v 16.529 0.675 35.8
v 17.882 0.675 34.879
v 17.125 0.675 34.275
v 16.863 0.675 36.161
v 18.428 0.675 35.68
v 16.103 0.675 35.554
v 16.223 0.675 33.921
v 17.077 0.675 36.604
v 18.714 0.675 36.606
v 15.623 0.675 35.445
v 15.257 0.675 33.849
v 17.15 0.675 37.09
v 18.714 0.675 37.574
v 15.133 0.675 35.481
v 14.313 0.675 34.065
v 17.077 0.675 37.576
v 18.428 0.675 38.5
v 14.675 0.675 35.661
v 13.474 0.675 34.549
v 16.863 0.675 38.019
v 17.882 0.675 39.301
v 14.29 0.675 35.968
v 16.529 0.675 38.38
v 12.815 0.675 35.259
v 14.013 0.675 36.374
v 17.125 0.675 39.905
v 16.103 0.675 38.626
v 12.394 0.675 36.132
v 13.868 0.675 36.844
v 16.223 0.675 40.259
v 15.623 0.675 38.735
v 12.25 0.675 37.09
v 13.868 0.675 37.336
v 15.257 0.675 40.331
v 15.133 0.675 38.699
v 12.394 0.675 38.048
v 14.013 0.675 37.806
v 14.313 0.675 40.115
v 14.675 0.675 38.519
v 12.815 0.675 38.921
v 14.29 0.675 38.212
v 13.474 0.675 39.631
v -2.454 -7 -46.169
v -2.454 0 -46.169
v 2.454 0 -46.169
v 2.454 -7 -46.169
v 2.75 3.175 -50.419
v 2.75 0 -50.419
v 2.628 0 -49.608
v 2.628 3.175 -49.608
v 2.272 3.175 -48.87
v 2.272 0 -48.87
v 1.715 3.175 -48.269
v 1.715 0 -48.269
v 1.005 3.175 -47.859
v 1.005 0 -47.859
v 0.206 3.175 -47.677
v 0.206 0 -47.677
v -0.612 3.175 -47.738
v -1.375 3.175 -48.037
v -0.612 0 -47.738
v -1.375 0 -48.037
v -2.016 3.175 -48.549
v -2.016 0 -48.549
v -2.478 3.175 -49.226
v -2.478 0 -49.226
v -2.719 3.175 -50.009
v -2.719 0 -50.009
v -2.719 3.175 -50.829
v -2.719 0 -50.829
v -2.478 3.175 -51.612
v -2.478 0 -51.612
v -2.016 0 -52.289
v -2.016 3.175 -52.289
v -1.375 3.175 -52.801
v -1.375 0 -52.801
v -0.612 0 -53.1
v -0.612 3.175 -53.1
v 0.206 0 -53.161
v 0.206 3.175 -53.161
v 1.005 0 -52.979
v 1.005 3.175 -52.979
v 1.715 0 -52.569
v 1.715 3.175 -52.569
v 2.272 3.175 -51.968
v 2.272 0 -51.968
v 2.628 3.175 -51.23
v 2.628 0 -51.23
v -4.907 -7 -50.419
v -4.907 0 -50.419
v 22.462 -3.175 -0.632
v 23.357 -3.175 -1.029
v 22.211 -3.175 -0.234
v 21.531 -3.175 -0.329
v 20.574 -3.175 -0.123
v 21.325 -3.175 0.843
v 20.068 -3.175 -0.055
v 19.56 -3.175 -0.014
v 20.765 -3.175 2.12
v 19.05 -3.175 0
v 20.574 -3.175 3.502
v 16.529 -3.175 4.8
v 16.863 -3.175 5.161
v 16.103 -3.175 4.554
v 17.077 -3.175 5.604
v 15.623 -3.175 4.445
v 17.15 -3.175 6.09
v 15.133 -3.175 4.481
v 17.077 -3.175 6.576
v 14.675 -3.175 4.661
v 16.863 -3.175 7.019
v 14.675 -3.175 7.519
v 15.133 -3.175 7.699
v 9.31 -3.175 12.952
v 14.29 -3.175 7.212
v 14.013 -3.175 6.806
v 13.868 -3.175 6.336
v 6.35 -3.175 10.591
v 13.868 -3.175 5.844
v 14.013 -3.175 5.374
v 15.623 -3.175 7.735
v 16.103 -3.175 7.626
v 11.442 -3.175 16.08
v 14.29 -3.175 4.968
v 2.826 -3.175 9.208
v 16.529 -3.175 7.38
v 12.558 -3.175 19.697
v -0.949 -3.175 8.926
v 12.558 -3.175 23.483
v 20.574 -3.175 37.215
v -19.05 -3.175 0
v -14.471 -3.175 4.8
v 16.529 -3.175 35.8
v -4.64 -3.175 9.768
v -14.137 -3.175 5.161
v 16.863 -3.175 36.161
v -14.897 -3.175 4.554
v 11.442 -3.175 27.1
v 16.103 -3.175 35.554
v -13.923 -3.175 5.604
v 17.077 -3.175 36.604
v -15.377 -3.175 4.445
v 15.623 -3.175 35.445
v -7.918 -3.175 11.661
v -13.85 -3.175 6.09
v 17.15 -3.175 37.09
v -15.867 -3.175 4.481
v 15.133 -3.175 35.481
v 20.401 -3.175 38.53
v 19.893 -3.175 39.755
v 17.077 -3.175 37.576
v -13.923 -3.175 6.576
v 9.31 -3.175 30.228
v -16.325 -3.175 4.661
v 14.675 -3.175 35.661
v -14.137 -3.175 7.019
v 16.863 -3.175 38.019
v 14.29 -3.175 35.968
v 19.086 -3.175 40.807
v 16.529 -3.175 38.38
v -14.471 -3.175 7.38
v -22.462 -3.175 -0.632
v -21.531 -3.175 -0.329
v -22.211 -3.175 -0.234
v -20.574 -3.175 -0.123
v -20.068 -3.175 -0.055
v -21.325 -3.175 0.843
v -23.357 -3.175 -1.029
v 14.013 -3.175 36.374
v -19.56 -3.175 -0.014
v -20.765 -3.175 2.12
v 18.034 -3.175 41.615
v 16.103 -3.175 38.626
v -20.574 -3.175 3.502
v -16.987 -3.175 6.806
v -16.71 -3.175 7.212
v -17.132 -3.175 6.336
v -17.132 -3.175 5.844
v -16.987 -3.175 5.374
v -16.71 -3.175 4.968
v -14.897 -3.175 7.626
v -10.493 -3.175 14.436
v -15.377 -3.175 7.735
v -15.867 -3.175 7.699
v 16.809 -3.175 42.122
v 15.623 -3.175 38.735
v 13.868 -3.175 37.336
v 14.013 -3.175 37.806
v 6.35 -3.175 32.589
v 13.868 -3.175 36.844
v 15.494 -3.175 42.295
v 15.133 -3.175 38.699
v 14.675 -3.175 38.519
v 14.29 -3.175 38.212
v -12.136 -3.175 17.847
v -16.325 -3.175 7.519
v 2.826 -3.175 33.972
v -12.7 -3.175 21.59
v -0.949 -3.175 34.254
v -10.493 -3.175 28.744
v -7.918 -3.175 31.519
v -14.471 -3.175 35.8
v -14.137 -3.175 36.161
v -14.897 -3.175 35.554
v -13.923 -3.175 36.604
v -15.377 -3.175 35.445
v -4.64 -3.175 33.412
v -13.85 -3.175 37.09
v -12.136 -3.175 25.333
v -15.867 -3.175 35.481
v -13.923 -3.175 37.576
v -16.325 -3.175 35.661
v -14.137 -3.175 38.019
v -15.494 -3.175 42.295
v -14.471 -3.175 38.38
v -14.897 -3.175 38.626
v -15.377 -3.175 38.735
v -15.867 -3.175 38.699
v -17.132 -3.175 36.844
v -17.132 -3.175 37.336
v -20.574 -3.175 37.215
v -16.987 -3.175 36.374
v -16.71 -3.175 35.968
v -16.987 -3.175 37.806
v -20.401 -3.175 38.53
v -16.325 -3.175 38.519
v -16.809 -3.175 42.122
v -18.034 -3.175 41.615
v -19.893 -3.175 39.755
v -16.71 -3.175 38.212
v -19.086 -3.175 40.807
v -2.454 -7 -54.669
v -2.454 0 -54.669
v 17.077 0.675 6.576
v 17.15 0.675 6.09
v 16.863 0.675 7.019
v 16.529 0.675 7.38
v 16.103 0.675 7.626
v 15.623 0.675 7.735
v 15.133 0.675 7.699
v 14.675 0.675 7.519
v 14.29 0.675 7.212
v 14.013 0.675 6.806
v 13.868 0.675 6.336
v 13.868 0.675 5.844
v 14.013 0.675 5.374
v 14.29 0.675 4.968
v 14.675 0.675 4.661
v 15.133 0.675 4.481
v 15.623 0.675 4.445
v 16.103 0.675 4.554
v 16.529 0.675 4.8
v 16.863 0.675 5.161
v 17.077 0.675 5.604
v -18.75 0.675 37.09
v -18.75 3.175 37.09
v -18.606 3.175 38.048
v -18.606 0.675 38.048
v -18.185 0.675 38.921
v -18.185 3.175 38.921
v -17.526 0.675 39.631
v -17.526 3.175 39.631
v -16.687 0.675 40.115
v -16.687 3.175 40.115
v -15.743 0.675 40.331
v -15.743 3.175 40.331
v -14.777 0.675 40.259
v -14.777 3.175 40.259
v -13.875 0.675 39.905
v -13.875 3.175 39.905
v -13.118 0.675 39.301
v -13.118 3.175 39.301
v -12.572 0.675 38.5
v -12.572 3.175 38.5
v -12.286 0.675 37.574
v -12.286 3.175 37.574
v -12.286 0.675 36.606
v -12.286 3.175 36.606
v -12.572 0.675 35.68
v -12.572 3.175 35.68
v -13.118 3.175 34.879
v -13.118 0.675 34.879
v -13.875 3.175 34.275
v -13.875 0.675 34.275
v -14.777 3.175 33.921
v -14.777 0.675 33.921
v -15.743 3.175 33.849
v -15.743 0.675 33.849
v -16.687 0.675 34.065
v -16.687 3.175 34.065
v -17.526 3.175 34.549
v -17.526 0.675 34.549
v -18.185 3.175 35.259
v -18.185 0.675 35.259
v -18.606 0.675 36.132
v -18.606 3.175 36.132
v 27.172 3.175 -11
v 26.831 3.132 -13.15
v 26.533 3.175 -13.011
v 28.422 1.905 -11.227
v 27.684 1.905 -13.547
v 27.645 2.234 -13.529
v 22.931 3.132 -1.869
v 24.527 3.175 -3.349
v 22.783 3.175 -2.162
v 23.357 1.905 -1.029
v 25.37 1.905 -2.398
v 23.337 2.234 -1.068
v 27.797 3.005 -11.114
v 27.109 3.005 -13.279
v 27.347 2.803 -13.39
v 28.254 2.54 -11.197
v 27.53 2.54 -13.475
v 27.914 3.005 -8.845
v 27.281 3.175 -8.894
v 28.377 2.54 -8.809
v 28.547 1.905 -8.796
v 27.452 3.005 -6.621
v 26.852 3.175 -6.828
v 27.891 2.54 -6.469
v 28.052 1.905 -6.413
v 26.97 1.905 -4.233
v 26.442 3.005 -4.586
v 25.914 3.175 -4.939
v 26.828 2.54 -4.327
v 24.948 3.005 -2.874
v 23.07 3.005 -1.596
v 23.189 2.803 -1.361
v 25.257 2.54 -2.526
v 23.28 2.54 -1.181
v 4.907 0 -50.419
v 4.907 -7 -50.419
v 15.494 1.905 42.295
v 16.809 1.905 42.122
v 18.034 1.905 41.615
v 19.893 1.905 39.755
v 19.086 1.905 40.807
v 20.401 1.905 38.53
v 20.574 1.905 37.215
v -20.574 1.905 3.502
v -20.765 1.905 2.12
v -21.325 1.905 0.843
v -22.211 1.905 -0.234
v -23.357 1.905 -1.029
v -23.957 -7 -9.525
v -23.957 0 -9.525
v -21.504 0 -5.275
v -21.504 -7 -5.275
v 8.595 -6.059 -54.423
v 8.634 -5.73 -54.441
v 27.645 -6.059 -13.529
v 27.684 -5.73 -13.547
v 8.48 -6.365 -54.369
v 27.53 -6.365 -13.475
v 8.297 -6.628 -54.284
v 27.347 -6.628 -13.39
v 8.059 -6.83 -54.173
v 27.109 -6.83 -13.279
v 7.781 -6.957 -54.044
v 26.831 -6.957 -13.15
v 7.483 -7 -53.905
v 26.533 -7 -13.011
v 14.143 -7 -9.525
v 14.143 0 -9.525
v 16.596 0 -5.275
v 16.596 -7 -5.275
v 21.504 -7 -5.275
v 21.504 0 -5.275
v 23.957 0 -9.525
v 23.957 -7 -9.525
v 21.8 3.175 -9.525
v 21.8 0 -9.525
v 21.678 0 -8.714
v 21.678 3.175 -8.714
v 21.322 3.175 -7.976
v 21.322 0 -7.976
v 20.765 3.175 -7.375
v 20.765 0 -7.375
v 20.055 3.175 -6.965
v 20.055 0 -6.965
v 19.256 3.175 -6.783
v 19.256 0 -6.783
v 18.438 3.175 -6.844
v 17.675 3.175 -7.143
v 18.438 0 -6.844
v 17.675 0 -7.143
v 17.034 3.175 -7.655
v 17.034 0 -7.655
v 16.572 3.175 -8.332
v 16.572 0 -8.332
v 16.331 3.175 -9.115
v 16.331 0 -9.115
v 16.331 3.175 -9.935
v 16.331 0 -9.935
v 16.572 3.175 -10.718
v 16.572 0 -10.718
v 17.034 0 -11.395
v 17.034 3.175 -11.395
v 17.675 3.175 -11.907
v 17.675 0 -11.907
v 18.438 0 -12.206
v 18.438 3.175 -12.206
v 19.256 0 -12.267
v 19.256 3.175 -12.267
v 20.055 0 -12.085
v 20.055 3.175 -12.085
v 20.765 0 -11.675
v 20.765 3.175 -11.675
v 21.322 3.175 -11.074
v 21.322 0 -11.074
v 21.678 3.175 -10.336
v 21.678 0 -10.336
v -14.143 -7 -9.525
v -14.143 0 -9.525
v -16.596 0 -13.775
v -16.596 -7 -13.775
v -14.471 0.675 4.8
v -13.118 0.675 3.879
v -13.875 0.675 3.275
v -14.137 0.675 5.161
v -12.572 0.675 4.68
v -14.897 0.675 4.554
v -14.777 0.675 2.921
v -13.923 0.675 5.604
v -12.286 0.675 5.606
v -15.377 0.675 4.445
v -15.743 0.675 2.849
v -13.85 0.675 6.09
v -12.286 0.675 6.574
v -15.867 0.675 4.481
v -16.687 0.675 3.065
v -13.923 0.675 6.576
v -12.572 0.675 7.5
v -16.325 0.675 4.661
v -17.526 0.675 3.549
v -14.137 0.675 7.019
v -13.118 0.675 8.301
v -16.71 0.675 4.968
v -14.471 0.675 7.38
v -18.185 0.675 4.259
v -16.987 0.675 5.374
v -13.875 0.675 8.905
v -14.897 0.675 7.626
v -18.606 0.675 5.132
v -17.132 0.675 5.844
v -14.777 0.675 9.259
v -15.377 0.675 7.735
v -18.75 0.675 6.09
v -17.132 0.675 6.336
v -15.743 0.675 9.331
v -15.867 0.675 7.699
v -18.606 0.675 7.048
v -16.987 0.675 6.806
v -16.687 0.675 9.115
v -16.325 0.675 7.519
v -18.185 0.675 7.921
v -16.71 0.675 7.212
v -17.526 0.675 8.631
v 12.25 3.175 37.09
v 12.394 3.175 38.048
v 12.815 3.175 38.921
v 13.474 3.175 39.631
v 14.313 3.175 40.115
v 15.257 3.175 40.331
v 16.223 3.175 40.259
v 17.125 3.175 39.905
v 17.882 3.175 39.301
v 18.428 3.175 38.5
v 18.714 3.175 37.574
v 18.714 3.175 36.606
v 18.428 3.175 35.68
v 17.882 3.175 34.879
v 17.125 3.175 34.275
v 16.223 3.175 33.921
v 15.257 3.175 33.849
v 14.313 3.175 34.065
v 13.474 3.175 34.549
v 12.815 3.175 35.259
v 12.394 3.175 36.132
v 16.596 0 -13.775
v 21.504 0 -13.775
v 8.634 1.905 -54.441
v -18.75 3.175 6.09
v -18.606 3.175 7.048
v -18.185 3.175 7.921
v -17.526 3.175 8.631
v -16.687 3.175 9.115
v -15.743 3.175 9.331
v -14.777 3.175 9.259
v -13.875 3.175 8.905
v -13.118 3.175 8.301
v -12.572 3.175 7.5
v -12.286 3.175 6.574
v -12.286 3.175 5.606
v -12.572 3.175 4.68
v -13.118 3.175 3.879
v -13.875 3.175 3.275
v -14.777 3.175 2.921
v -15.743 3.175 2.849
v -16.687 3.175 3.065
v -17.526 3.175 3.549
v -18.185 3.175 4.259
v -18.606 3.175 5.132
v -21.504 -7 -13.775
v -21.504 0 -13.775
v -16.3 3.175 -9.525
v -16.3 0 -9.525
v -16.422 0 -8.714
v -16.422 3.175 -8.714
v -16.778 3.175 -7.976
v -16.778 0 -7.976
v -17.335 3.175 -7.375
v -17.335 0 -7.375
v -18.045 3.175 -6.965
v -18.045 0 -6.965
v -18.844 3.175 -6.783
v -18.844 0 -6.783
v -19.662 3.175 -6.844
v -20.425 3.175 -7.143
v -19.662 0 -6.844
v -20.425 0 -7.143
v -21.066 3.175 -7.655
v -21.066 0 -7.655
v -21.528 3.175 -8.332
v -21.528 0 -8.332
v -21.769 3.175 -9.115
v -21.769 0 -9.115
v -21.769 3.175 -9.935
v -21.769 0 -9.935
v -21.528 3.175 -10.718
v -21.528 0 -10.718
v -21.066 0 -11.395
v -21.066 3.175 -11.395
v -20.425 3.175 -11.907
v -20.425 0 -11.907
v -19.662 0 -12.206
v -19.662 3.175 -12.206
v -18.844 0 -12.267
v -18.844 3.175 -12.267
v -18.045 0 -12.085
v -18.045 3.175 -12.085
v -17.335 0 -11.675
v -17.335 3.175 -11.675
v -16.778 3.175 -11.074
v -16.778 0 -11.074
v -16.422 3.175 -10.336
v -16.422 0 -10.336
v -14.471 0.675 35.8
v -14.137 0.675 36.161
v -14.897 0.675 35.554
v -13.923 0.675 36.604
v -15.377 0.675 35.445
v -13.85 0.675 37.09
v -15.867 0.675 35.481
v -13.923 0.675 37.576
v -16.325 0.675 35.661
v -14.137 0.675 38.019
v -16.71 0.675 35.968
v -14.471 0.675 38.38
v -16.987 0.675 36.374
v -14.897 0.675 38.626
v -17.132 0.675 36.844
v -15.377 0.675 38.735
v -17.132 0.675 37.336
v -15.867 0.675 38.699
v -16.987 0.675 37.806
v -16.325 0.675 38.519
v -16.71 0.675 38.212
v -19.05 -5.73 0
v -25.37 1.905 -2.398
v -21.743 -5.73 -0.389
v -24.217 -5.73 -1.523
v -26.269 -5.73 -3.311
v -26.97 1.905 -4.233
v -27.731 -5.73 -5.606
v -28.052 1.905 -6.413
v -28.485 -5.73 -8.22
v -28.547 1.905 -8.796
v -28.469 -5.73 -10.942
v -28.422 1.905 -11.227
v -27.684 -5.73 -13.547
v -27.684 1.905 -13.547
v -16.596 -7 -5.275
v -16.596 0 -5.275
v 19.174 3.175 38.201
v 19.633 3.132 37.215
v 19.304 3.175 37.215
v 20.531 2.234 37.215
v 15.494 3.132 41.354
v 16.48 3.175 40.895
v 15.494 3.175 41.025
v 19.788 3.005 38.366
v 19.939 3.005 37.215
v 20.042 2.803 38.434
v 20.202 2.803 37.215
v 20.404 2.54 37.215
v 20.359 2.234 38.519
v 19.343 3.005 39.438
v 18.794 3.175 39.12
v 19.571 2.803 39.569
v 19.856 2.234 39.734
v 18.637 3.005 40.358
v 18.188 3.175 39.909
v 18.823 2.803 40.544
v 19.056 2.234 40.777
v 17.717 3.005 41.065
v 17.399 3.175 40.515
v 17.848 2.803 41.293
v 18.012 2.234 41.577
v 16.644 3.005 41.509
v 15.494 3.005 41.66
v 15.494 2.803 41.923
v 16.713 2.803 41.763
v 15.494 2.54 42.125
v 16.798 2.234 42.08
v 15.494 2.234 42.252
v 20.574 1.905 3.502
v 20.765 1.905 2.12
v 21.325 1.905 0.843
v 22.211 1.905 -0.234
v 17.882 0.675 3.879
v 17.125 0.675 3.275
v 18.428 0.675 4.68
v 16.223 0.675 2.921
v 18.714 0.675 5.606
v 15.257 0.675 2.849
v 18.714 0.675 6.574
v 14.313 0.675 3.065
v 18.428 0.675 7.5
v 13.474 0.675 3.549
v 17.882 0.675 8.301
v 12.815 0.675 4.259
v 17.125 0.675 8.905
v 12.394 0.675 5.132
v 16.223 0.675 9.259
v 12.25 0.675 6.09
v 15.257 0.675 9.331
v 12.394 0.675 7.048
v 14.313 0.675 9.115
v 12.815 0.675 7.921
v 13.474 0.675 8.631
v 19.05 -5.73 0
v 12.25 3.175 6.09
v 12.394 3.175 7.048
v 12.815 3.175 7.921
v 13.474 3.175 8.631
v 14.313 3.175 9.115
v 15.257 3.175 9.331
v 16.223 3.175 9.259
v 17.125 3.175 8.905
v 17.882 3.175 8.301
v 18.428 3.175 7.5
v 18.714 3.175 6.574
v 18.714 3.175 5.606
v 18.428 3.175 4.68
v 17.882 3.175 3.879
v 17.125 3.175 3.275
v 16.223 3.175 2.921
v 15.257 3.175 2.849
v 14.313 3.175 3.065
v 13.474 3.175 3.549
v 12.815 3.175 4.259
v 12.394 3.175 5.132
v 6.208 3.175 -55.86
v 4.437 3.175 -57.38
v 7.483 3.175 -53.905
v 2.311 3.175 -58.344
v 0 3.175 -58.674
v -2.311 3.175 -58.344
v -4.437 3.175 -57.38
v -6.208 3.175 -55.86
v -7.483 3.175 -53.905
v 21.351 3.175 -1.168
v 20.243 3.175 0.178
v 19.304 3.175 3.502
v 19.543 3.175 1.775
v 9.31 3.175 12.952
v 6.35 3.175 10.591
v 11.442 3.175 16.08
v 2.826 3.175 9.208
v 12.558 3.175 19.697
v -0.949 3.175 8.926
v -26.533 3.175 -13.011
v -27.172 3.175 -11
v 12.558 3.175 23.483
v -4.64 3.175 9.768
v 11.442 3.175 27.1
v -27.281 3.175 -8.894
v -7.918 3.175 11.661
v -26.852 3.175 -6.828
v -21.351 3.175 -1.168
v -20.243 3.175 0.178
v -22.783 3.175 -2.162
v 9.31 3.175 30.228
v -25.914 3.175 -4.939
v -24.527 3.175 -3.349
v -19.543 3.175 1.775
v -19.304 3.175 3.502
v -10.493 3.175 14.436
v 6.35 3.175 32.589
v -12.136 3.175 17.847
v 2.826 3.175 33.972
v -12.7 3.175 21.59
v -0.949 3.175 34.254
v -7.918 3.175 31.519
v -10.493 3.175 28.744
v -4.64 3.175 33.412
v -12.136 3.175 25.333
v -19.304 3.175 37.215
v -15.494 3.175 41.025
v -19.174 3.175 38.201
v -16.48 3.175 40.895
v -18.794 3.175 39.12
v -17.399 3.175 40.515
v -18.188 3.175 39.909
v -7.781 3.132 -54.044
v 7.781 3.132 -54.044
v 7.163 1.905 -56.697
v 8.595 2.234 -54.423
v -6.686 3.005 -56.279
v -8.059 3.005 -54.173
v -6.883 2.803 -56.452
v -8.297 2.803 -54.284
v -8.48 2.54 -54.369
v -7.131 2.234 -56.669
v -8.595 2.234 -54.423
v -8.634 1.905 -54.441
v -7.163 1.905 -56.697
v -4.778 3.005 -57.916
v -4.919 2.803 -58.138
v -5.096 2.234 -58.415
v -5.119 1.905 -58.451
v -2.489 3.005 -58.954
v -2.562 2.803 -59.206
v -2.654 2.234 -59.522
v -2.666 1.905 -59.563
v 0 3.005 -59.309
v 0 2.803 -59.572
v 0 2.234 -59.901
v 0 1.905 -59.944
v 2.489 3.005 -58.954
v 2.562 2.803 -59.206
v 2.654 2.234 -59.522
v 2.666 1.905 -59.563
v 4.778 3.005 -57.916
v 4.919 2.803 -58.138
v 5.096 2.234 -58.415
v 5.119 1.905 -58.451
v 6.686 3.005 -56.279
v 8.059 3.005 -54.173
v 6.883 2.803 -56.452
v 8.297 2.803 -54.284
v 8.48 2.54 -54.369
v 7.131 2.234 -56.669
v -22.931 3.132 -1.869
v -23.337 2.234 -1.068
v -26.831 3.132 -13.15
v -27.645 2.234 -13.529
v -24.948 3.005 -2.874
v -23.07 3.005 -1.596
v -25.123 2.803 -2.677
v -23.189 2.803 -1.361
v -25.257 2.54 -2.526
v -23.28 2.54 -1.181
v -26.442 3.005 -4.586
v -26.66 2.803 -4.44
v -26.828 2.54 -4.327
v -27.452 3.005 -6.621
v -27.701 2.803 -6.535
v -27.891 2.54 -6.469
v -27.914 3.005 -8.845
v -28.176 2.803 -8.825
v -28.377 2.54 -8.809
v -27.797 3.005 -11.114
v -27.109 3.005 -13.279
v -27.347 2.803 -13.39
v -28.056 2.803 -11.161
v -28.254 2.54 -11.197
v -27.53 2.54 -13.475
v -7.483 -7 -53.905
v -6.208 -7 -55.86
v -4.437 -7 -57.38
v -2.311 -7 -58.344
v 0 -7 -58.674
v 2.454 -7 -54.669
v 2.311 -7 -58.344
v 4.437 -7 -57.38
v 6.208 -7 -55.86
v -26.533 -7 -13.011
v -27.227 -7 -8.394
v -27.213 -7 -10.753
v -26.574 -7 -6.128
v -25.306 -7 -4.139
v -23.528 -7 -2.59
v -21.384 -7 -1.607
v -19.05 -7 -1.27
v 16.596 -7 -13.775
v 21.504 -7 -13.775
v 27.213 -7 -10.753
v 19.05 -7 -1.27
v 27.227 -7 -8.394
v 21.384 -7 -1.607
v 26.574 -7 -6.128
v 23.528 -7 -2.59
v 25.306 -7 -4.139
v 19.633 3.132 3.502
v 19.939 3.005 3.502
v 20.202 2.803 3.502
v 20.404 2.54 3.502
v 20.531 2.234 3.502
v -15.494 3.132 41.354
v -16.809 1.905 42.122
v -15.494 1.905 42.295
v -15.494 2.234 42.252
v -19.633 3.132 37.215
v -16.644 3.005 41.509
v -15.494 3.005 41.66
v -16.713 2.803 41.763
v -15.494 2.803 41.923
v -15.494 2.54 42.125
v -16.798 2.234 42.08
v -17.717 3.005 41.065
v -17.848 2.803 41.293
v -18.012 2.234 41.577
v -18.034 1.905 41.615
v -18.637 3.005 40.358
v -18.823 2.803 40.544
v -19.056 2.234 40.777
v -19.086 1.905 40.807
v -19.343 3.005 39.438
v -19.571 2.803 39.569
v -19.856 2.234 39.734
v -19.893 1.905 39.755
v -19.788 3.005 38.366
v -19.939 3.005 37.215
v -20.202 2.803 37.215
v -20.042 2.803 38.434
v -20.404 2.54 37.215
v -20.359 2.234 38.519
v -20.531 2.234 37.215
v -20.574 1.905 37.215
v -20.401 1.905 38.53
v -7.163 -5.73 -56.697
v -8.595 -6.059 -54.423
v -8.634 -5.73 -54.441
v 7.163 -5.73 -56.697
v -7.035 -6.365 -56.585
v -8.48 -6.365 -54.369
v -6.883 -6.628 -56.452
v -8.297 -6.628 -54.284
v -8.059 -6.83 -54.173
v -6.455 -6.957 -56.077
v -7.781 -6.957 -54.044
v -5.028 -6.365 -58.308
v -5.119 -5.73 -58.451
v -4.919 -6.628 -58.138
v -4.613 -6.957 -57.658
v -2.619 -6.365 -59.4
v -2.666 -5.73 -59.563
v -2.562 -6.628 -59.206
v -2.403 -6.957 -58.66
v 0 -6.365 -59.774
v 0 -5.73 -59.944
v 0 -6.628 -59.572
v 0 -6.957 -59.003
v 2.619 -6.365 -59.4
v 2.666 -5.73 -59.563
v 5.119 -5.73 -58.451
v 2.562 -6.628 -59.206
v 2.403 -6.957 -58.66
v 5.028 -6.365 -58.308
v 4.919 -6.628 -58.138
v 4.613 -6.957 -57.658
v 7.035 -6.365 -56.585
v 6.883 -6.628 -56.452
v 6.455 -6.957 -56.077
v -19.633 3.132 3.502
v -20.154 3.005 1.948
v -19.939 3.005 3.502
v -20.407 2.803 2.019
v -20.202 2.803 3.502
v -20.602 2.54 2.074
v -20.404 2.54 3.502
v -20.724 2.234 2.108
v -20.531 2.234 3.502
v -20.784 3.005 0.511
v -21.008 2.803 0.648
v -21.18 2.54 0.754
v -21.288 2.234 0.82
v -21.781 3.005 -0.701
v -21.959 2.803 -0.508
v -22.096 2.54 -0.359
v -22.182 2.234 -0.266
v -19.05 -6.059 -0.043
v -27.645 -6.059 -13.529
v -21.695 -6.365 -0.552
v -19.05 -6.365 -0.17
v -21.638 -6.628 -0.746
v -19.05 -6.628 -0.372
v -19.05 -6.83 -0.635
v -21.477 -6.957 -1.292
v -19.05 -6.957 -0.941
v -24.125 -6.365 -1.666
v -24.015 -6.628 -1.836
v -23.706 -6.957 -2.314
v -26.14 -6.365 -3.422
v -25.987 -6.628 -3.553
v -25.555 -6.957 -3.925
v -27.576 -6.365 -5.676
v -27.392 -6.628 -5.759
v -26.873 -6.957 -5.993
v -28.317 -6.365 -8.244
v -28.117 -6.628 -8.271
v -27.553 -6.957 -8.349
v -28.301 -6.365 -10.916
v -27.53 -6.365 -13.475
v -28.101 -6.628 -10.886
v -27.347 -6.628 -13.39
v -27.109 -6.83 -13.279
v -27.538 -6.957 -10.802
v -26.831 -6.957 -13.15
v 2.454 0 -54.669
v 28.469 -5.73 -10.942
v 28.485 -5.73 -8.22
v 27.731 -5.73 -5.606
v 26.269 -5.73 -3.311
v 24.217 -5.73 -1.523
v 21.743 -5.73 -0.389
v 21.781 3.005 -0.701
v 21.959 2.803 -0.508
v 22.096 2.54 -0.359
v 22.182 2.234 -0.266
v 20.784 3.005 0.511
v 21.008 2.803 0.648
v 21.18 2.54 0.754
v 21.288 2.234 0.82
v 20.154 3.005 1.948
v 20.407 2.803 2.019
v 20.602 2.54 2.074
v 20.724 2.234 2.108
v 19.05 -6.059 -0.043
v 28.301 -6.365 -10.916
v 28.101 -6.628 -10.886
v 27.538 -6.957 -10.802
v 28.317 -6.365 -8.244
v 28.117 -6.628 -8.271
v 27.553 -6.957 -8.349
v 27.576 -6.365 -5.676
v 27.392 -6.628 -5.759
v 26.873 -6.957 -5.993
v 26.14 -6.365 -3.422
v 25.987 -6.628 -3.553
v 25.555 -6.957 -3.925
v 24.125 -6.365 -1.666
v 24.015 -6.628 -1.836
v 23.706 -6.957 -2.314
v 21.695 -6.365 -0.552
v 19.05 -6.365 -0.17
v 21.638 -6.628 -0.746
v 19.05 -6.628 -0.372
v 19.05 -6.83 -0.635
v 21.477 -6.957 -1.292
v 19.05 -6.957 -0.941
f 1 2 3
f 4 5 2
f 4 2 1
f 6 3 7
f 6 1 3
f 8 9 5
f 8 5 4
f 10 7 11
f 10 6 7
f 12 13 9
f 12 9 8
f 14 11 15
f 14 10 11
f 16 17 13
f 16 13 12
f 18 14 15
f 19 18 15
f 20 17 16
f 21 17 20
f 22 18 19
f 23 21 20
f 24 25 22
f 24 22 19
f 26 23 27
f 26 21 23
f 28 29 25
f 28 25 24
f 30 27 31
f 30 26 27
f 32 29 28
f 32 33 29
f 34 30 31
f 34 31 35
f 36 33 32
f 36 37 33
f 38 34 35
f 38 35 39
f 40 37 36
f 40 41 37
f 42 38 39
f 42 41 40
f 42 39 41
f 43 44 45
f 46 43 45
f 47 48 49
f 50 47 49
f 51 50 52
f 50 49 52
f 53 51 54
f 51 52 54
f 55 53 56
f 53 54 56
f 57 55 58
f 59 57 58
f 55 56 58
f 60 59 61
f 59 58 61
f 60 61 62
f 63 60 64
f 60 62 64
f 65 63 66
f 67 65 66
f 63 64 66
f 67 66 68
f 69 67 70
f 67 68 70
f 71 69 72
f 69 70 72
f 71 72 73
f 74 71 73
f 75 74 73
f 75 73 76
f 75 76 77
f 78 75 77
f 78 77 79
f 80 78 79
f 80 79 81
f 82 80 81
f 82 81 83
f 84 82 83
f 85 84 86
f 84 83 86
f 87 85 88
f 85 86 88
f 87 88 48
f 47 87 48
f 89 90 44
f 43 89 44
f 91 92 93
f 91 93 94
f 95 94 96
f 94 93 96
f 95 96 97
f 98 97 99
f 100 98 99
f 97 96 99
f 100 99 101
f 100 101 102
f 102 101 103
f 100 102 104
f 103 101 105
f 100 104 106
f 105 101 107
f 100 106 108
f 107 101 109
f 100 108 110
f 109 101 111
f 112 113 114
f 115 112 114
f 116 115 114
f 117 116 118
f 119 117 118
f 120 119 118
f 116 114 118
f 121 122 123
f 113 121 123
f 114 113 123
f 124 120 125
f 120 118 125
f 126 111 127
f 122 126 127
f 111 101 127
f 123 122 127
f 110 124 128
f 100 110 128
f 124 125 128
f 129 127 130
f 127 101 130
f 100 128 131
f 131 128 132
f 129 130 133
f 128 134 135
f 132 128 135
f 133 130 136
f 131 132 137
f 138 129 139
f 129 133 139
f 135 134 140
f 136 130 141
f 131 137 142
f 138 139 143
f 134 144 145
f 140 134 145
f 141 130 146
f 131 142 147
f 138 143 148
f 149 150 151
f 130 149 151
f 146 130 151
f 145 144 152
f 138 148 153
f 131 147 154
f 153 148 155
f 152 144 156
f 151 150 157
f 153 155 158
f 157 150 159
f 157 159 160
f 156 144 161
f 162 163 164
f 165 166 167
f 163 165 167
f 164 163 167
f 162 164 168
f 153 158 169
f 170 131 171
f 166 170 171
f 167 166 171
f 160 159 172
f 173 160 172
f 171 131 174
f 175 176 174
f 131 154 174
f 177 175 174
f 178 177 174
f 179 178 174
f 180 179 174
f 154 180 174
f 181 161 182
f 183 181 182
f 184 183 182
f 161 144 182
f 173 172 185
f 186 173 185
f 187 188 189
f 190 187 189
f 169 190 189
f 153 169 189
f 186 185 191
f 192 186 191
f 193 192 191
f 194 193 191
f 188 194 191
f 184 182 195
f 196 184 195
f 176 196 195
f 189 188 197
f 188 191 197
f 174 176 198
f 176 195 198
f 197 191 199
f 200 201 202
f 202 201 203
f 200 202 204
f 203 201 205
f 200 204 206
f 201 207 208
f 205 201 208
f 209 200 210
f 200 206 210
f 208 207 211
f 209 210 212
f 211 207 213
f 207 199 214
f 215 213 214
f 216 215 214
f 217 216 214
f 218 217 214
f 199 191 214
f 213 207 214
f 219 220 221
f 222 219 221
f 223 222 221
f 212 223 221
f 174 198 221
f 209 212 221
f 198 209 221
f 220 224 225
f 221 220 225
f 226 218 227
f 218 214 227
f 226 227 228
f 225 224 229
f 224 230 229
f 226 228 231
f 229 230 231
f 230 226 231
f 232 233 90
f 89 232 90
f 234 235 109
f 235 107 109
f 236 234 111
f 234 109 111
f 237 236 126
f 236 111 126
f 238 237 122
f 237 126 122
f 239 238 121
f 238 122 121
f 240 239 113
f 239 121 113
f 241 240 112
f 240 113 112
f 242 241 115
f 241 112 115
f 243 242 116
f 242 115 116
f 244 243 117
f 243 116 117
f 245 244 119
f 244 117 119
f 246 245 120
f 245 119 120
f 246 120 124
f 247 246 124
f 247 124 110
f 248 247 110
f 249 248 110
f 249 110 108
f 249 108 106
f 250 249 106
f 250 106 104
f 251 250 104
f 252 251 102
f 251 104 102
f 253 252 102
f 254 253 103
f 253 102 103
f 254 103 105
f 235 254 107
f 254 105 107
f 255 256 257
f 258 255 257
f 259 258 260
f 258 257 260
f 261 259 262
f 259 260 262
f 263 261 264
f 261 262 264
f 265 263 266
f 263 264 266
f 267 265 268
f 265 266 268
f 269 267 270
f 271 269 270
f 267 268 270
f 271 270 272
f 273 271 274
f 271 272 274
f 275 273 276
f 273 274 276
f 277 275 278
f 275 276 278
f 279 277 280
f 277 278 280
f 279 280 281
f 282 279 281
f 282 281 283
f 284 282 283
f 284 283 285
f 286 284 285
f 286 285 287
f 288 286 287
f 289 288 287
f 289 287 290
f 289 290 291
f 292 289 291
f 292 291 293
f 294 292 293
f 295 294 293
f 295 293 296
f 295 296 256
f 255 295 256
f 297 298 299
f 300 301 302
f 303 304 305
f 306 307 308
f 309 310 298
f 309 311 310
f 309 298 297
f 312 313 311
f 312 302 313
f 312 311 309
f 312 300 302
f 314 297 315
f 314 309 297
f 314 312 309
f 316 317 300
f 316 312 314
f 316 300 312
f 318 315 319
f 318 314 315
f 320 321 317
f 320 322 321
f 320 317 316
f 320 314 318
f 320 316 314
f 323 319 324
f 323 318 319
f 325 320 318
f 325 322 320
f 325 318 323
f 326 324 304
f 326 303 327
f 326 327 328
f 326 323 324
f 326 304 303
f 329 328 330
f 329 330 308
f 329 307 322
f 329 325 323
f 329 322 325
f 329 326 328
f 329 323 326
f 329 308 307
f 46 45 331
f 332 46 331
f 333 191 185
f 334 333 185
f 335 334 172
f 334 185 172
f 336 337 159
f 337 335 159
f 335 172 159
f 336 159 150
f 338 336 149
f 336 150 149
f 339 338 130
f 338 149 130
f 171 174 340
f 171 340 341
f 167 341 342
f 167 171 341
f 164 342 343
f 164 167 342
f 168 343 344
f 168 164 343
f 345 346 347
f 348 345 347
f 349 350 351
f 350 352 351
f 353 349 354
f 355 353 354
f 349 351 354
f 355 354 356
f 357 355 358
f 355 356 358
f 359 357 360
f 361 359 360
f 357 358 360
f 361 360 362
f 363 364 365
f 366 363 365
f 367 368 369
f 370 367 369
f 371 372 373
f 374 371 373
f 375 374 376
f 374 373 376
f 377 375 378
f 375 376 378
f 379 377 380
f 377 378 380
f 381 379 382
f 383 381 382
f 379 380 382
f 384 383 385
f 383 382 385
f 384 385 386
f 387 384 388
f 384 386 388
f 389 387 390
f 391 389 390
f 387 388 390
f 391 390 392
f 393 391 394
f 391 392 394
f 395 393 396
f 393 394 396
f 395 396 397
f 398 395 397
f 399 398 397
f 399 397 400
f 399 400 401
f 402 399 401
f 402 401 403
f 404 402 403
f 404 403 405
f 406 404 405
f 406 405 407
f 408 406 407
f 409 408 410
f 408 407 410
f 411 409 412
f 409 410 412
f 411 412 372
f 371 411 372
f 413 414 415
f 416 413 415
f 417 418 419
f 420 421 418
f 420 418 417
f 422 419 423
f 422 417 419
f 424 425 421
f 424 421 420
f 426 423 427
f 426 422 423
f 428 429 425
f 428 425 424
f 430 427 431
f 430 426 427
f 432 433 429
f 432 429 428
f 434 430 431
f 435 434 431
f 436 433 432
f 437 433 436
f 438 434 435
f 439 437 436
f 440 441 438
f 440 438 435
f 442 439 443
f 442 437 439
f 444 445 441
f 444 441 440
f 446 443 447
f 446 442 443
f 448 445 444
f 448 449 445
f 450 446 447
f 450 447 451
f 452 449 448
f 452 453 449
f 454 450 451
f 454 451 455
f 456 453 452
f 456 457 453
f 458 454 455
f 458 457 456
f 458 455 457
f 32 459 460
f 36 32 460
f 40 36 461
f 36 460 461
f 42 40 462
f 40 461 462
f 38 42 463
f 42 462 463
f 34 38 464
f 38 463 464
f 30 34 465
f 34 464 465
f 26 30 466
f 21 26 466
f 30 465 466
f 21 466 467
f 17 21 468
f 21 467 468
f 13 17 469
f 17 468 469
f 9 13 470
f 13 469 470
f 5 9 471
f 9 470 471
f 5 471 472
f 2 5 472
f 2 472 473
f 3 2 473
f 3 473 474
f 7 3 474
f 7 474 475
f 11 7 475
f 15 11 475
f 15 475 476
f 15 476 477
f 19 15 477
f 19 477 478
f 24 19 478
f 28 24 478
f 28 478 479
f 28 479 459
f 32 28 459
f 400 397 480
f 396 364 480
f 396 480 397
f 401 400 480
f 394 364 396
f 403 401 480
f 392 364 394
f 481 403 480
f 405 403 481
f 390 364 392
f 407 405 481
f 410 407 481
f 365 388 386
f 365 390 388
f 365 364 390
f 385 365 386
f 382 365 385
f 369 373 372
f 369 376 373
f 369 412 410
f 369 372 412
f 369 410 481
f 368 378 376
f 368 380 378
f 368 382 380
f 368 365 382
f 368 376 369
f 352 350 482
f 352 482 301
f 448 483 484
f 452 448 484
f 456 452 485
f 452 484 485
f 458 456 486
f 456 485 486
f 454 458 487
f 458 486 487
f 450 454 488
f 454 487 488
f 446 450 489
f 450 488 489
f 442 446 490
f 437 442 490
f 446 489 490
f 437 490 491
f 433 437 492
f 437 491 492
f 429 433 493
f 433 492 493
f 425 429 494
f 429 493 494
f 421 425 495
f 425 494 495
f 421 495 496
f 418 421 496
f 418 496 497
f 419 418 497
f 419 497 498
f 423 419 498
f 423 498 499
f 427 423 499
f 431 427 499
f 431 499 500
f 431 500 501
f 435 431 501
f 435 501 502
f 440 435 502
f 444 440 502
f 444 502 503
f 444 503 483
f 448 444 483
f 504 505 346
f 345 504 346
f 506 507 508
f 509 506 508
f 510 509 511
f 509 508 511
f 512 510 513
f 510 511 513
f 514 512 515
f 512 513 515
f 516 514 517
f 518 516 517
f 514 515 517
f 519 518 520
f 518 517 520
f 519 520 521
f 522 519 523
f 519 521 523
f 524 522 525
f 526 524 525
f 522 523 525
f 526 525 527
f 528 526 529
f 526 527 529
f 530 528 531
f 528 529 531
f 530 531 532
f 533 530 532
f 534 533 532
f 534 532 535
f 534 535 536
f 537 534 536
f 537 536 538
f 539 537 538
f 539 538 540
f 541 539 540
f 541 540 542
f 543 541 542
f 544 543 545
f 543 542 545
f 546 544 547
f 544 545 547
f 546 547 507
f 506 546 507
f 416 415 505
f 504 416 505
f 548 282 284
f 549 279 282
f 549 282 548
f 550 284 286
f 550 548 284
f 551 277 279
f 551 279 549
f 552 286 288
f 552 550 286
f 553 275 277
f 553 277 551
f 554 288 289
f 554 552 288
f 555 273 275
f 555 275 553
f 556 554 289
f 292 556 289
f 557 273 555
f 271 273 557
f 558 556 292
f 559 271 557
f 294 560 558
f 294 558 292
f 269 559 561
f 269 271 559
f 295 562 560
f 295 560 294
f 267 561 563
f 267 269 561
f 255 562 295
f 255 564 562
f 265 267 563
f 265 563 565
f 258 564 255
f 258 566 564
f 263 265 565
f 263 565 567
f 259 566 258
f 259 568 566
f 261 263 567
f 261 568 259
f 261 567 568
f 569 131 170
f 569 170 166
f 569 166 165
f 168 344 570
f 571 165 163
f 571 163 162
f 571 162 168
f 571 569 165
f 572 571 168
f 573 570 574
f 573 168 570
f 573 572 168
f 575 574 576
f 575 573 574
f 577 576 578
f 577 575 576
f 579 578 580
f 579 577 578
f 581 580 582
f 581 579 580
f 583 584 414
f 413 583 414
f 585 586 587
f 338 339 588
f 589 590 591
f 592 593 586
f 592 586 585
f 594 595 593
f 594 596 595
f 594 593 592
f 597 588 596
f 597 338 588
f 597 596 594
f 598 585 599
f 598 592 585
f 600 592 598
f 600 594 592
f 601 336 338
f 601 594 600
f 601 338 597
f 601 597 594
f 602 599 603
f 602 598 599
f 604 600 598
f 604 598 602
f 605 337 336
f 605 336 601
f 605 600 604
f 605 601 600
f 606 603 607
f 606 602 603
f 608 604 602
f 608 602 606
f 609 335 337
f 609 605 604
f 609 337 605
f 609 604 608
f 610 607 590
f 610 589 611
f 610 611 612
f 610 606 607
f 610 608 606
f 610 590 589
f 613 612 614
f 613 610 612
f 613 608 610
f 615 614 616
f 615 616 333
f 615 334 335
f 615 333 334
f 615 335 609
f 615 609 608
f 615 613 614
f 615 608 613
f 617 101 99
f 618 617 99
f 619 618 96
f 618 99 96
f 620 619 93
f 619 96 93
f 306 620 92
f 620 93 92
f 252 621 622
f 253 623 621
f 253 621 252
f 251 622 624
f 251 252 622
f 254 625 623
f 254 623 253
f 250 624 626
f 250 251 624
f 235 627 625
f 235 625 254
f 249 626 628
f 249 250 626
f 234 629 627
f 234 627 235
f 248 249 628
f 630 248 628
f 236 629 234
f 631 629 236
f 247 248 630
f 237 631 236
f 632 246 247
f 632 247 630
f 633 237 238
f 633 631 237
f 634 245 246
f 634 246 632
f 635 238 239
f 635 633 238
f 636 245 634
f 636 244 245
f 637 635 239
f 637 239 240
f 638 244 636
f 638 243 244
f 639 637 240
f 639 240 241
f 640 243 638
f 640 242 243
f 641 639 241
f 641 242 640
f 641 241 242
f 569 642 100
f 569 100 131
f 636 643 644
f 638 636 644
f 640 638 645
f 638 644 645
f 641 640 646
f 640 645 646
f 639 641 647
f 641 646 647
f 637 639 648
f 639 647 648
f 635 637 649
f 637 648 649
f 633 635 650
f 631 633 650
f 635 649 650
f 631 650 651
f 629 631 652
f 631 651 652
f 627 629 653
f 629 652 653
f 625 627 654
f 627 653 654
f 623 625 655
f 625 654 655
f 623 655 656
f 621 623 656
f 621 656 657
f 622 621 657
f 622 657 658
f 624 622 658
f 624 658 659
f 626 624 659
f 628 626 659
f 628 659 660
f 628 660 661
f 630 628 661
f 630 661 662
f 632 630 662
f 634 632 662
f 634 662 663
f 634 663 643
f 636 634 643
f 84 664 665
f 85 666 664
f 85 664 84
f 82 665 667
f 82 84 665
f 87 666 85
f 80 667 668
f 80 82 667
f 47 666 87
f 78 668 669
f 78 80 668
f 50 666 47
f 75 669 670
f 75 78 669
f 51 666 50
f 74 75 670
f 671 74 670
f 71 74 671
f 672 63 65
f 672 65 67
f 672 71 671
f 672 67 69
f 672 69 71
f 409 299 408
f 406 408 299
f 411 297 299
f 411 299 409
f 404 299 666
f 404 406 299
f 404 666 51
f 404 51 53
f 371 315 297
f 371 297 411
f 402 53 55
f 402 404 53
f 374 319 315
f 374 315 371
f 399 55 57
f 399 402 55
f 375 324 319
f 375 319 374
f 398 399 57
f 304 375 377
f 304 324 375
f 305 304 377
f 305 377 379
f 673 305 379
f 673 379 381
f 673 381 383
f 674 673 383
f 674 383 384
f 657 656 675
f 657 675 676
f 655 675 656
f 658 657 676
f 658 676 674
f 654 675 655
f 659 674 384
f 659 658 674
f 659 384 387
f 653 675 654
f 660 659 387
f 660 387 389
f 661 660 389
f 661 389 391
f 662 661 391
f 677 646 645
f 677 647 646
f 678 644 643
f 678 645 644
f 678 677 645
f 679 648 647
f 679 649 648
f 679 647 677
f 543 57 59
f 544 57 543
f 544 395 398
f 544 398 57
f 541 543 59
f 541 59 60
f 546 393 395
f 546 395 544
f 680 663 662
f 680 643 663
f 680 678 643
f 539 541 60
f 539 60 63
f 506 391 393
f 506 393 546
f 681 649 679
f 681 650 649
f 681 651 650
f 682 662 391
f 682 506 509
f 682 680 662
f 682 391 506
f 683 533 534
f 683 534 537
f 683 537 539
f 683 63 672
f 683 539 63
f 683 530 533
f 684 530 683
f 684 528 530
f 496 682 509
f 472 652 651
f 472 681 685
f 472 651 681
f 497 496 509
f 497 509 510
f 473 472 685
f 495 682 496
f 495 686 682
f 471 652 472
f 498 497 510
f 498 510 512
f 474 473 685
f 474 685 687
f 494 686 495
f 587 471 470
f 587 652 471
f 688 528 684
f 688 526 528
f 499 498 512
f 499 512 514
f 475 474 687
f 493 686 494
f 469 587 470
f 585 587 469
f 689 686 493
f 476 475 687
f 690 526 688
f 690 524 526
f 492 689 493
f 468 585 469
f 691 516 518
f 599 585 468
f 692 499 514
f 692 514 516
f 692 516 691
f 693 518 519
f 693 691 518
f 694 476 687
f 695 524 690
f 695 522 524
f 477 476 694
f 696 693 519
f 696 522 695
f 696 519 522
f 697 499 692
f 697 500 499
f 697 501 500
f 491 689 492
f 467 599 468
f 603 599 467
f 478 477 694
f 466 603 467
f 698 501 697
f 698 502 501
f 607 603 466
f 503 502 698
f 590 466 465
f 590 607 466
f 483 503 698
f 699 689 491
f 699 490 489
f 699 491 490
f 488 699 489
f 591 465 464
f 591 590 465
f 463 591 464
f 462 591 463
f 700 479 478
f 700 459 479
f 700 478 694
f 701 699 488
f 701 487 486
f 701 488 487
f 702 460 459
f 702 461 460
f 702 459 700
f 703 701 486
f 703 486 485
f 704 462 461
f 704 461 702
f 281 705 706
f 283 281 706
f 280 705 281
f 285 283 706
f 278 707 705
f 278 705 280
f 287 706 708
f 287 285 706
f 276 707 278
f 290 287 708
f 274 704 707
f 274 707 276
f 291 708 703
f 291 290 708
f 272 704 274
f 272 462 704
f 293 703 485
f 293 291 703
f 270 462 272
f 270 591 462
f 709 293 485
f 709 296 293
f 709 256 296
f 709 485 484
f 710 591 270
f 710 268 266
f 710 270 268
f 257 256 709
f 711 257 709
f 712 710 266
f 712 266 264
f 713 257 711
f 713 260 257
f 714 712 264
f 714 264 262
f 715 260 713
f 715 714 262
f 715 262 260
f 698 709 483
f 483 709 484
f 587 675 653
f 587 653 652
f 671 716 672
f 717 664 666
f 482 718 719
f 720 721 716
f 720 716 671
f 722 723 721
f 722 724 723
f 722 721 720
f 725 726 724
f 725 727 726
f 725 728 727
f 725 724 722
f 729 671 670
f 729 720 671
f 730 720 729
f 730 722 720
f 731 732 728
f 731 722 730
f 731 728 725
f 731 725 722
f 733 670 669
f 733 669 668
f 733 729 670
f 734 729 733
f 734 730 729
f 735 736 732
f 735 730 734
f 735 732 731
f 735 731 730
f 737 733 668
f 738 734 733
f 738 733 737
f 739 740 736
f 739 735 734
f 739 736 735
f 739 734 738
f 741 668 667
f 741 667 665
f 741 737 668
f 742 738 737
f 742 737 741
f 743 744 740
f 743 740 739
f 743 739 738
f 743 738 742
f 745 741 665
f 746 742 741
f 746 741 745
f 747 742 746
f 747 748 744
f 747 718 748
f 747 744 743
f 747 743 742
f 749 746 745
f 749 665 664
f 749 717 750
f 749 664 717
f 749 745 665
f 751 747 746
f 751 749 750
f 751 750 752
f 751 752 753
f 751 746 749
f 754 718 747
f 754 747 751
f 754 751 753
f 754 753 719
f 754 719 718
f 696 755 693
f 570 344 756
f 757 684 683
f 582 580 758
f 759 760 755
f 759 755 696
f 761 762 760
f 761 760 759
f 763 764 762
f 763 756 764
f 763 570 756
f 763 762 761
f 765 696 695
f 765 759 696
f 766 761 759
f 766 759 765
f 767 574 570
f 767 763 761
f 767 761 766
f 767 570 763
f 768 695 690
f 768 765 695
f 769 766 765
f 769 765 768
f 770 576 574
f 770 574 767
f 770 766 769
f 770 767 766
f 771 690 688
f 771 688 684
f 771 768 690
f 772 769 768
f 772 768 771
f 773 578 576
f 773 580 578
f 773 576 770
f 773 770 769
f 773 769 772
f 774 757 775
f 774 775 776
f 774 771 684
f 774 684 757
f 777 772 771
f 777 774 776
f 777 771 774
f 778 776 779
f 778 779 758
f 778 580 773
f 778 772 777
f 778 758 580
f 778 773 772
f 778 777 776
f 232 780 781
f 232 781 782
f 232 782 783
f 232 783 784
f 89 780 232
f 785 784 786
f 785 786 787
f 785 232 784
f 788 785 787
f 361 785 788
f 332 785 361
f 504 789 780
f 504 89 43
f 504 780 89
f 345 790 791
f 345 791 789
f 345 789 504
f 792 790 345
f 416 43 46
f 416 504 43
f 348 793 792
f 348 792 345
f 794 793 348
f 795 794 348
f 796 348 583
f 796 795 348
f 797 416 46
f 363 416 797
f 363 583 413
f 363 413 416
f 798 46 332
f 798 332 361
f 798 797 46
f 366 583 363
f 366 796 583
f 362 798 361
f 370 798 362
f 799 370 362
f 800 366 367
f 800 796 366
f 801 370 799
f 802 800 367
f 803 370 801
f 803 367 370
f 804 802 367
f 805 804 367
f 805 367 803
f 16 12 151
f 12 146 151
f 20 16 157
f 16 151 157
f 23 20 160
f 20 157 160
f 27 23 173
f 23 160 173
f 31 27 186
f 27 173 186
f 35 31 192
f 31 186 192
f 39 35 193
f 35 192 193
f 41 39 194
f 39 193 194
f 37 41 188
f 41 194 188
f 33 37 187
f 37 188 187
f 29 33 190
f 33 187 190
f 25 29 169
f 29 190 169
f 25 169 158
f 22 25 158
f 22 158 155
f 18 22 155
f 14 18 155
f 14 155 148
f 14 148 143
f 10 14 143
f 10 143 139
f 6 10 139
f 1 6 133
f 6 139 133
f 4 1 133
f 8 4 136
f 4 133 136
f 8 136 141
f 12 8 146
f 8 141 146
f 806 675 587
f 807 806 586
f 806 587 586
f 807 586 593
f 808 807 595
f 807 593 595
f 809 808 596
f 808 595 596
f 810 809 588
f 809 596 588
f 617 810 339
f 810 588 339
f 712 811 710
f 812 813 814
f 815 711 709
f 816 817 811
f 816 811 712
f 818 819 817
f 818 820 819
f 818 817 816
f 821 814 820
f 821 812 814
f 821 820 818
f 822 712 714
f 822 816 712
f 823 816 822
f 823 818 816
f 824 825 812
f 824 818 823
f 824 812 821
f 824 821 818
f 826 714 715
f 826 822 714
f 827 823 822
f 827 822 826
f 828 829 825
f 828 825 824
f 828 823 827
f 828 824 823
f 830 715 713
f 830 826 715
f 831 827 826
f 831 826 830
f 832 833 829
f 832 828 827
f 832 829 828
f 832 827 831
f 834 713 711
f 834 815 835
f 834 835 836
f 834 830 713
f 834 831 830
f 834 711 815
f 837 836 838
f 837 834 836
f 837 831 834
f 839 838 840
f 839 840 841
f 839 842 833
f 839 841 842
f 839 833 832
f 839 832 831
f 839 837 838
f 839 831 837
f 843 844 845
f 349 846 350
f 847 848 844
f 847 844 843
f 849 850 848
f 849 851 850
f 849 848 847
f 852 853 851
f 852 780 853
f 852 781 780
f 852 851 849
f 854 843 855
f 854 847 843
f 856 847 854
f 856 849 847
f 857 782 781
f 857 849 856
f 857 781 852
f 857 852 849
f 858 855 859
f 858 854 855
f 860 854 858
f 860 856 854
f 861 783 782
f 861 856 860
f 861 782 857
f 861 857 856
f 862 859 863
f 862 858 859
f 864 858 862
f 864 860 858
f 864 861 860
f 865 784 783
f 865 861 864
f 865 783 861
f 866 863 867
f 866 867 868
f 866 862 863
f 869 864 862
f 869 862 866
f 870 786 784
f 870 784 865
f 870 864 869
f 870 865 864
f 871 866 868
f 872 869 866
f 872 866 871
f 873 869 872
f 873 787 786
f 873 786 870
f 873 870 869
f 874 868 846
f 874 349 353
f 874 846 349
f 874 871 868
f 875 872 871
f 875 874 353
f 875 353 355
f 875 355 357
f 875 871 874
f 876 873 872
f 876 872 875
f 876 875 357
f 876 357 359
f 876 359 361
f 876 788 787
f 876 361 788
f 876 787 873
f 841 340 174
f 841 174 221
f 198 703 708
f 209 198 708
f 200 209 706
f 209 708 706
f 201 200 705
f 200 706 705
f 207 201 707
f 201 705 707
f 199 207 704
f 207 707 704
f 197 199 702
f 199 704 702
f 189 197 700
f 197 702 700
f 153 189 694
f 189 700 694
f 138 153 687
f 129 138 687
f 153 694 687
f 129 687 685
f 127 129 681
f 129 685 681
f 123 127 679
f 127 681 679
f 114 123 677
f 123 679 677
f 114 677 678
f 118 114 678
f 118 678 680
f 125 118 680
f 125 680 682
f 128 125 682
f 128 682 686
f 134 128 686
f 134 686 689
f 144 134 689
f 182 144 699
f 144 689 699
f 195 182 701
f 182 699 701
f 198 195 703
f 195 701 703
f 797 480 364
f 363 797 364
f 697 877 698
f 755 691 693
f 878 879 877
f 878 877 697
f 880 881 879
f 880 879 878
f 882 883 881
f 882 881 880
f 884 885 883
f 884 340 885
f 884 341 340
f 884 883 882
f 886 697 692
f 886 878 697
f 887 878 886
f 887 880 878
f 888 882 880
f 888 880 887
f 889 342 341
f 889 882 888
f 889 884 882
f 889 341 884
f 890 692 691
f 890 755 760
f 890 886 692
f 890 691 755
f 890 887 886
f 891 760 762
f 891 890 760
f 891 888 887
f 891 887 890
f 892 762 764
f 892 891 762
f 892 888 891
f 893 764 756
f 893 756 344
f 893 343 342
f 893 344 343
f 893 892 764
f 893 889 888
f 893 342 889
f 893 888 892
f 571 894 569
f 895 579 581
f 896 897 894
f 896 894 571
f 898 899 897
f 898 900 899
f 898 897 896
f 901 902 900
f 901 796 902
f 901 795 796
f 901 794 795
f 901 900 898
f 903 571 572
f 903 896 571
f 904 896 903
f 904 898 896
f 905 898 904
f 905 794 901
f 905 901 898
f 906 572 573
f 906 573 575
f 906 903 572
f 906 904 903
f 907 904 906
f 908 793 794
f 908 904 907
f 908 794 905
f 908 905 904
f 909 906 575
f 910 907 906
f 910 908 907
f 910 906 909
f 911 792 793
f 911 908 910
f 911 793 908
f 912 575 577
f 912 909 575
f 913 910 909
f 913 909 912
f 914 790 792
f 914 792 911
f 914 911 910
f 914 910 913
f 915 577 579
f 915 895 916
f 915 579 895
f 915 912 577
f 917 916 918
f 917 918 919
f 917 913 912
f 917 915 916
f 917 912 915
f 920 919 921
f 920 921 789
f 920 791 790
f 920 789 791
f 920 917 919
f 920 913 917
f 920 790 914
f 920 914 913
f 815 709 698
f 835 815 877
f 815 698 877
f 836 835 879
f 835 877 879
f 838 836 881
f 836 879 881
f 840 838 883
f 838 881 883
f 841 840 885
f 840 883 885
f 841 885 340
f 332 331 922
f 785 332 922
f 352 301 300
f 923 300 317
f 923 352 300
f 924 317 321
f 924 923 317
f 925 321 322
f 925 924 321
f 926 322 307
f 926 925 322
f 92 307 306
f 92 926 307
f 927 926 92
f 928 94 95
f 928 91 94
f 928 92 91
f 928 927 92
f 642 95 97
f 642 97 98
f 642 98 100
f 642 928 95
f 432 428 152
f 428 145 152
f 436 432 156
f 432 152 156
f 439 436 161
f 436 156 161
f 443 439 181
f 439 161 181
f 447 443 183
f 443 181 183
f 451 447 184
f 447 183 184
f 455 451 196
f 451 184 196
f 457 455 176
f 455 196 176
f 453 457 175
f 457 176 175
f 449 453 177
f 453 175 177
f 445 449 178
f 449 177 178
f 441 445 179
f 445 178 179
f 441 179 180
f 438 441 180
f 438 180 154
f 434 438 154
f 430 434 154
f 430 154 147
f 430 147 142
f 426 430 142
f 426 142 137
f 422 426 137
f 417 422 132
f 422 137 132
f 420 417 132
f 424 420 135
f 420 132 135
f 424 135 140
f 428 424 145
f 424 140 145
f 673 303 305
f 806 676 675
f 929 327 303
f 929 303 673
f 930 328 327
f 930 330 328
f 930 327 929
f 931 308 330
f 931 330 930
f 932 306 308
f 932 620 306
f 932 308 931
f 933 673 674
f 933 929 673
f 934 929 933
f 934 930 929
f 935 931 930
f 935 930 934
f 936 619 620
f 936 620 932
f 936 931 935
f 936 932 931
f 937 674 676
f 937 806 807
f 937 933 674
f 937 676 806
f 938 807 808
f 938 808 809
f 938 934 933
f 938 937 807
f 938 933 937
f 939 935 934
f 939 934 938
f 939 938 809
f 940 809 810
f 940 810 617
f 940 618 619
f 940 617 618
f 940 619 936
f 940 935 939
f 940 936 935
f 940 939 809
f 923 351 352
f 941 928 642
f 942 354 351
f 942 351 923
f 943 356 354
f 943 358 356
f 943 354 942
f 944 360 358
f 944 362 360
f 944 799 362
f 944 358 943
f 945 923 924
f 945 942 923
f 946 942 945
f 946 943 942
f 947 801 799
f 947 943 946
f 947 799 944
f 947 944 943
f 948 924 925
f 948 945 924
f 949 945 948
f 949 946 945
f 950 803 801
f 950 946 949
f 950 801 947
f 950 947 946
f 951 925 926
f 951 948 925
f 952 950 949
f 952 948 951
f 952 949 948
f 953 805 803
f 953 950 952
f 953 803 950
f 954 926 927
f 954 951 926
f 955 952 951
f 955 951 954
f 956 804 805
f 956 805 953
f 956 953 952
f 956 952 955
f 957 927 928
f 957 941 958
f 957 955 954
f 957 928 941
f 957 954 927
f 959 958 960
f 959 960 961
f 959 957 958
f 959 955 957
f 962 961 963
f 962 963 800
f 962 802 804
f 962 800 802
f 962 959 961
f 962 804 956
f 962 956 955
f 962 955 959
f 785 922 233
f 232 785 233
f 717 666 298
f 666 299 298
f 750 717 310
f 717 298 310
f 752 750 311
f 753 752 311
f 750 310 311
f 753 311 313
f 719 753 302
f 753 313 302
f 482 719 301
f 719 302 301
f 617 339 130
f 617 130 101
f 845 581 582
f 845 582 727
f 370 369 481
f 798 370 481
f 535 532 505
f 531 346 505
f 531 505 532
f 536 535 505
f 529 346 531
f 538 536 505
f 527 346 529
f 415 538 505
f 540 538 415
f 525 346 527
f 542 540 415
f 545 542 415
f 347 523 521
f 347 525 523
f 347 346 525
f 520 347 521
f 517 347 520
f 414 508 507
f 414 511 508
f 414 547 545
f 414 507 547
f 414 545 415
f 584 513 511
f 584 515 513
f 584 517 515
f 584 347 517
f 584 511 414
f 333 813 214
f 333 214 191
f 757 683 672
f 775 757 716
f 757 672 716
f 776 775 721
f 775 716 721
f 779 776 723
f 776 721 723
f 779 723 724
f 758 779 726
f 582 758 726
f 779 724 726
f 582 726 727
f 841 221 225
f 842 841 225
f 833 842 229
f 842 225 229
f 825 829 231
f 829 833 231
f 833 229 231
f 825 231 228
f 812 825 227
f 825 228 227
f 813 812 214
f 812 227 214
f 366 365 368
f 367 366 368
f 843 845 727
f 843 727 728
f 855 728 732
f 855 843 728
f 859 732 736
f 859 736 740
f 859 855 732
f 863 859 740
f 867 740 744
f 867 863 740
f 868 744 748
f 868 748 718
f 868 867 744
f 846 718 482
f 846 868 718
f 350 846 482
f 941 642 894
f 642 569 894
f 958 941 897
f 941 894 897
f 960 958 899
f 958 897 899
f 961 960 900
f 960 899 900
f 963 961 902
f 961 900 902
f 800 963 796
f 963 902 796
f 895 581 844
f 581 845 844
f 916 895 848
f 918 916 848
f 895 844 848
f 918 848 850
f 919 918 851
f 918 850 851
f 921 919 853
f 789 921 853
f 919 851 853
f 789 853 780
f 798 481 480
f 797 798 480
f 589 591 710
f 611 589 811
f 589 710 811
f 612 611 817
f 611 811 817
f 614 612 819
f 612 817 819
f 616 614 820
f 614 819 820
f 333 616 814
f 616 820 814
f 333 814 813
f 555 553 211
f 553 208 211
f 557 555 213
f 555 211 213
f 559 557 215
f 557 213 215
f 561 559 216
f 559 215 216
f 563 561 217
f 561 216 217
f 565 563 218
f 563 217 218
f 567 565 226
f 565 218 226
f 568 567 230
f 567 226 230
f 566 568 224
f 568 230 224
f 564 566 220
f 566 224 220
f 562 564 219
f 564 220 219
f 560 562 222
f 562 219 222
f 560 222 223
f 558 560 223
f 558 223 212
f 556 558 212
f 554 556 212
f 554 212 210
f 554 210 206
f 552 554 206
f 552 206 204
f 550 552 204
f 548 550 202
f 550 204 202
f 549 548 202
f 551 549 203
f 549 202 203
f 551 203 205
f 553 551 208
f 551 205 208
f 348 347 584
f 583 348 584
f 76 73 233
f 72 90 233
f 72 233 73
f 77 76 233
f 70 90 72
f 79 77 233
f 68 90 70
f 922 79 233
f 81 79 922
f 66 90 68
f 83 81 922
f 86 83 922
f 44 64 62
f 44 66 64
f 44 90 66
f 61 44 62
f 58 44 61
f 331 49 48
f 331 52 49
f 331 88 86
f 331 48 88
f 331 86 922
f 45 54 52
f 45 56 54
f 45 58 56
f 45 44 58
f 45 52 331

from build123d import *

# Parameters (mm, degrees)
F1_DEPTH       = 7
F0_R           = 2.75
F2_DEPTH       = 3.175
F3_R           = 12.7
F4_DEPTH       = 6.35
F5_D           = 3.3
F5_CBORE_D     = 6.5
F5_CBORE_DEPTH = 2.5
F6_R           = 5.08
F7_R           = 1.27


with BuildPart() as f1:
    # F0 (on Front) → F1 (new body)
    with BuildSketch(Plane.XZ):
        with BuildLine():
            Line((19.05, 0), (-19.05, 0))
            ThreePointArc((-19.05, 0), (-27.0823171118, -4.4056732068), (-27.6841325359, -13.5471114297))
            Line((-27.6841325359, -13.5471114297), (-8.6341325359, -54.4411114297))
            ThreePointArc((-8.6341325359, -54.4411114297), (0, -59.944), (8.6341325359, -54.4411114297))
            Line((8.6341325359, -54.4411114297), (27.6841325359, -13.5471114297))
            ThreePointArc((27.6841325359, -13.5471114297), (27.0823171118, -4.4056732068), (19.05, 0))
        make_face()
        Polygon((4.9074772881, -50.419), (2.4537386441, -54.669), (-2.4537386441, -54.669), (-4.9074772881, -50.419), (-2.4537386441, -46.169), (2.4537386441, -46.169), align=None, mode=Mode.SUBTRACT)
        Polygon((-14.1425227119, -9.525), (-16.5962613559, -13.775), (-21.5037386441, -13.775), (-23.9574772881, -9.525), (-21.5037386441, -5.275), (-16.5962613559, -5.275), align=None, mode=Mode.SUBTRACT)
        Polygon((23.9574772881, -9.525), (21.5037386441, -13.775), (16.5962613559, -13.775), (14.1425227119, -9.525), (16.5962613559, -5.275), (21.5037386441, -5.275), align=None, mode=Mode.SUBTRACT)
    extrude(amount=F1_DEPTH)

    # F0 (on Front) → F2 (join)
    with BuildSketch(Plane.XZ):
        with BuildLine():
            Line((19.05, 0), (-19.05, 0))
            ThreePointArc((-19.05, 0), (-27.0823171118, -4.4056732068), (-27.6841325359, -13.5471114297))
            Line((-27.6841325359, -13.5471114297), (-8.6341325359, -54.4411114297))
            ThreePointArc((-8.6341325359, -54.4411114297), (0, -59.944), (8.6341325359, -54.4411114297))
            Line((8.6341325359, -54.4411114297), (27.6841325359, -13.5471114297))
            ThreePointArc((27.6841325359, -13.5471114297), (27.0823171118, -4.4056732068), (19.05, 0))
        make_face()
        Polygon((4.9074772881, -50.419), (2.4537386441, -54.669), (-2.4537386441, -54.669), (-4.9074772881, -50.419), (-2.4537386441, -46.169), (2.4537386441, -46.169), align=None, mode=Mode.SUBTRACT)
        Polygon((-14.1425227119, -9.525), (-16.5962613559, -13.775), (-21.5037386441, -13.775), (-23.9574772881, -9.525), (-21.5037386441, -5.275), (-16.5962613559, -5.275), align=None, mode=Mode.SUBTRACT)
        Polygon((23.9574772881, -9.525), (21.5037386441, -13.775), (16.5962613559, -13.775), (14.1425227119, -9.525), (16.5962613559, -5.275), (21.5037386441, -5.275), align=None, mode=Mode.SUBTRACT)
        Polygon((16.5962613559, -13.775), (21.5037386441, -13.775), (23.9574772881, -9.525), (21.5037386441, -5.275), (16.5962613559, -5.275), (14.1425227119, -9.525), align=None)
        with Locations((19.05, -9.525)):
            Circle(F0_R, mode=Mode.SUBTRACT)
        Polygon((-21.5037386441, -13.775), (-16.5962613559, -13.775), (-14.1425227119, -9.525), (-16.5962613559, -5.275), (-21.5037386441, -5.275), (-23.9574772881, -9.525), align=None)
        with Locations((-19.05, -9.525)):
            Circle(F0_R, mode=Mode.SUBTRACT)
        Polygon((-2.4537386441, -54.669), (2.4537386441, -54.669), (4.9074772881, -50.419), (2.4537386441, -46.169), (-2.4537386441, -46.169), (-4.9074772881, -50.419), align=None)
        with Locations((0, -50.419)):
            Circle(F0_R, mode=Mode.SUBTRACT)
    extrude(amount=-F2_DEPTH)

    # F3 (on face) → F4 (join)
    with BuildSketch(Plane(origin=(0, 3.175, 0), x_dir=(-1, 0, 0), z_dir=(0, 1, 0))):
        with BuildLine():
            Line((20.574, -0.1227104384), (20.574, 42.2952895616))
            Line((20.574, 42.2952895616), (-20.574, 42.2952895616))
            Line((-20.574, 42.2952895616), (-20.574, -0.1227104384))
            ThreePointArc((-20.574, -0.1227104384), (-19.8144661294, -0.0307271718), (-19.05, 0))
            Line((-19.05, 0), (19.05, 0))
            ThreePointArc((19.05, 0), (19.8144661294, -0.0307271718), (20.574, -0.1227104384))
        make_face()
        with Locations((0, 21.59)):
            Circle(F3_R, mode=Mode.SUBTRACT)
    extrude(amount=-F4_DEPTH)

    # F5 (through all)
    with Locations(Plane(origin=(0, 3.175, 0), x_dir=(-1, 0, 0), z_dir=(0, 1, 0))):
        with Locations((-15.5, 37.09), (15.5, 37.09), (15.5, 6.09), (-15.5, 6.09)):
            CounterBoreHole(F5_D / 2, F5_CBORE_D / 2, F5_CBORE_DEPTH)

    # F6
    f6_edges = [f1.edges().sort_by_distance(p)[0] for p in [
        (20.574, 0, 42.29529),
        (-20.574, 0, 42.29529),
        (-20.574, 0, -0.12271),
        (20.574, 0, -0.12271),
    ]]
    fillet(f6_edges, radius=F6_R)

    # F7
    f7_edges = [f1.edges().sort_by_distance(p)[0] for p in [
        (28.052301, 3.175, -6.413054),
        (18.159133, -7, -33.994111),
    ]]
    fillet(f7_edges, radius=F7_R)


solid = f1.part
